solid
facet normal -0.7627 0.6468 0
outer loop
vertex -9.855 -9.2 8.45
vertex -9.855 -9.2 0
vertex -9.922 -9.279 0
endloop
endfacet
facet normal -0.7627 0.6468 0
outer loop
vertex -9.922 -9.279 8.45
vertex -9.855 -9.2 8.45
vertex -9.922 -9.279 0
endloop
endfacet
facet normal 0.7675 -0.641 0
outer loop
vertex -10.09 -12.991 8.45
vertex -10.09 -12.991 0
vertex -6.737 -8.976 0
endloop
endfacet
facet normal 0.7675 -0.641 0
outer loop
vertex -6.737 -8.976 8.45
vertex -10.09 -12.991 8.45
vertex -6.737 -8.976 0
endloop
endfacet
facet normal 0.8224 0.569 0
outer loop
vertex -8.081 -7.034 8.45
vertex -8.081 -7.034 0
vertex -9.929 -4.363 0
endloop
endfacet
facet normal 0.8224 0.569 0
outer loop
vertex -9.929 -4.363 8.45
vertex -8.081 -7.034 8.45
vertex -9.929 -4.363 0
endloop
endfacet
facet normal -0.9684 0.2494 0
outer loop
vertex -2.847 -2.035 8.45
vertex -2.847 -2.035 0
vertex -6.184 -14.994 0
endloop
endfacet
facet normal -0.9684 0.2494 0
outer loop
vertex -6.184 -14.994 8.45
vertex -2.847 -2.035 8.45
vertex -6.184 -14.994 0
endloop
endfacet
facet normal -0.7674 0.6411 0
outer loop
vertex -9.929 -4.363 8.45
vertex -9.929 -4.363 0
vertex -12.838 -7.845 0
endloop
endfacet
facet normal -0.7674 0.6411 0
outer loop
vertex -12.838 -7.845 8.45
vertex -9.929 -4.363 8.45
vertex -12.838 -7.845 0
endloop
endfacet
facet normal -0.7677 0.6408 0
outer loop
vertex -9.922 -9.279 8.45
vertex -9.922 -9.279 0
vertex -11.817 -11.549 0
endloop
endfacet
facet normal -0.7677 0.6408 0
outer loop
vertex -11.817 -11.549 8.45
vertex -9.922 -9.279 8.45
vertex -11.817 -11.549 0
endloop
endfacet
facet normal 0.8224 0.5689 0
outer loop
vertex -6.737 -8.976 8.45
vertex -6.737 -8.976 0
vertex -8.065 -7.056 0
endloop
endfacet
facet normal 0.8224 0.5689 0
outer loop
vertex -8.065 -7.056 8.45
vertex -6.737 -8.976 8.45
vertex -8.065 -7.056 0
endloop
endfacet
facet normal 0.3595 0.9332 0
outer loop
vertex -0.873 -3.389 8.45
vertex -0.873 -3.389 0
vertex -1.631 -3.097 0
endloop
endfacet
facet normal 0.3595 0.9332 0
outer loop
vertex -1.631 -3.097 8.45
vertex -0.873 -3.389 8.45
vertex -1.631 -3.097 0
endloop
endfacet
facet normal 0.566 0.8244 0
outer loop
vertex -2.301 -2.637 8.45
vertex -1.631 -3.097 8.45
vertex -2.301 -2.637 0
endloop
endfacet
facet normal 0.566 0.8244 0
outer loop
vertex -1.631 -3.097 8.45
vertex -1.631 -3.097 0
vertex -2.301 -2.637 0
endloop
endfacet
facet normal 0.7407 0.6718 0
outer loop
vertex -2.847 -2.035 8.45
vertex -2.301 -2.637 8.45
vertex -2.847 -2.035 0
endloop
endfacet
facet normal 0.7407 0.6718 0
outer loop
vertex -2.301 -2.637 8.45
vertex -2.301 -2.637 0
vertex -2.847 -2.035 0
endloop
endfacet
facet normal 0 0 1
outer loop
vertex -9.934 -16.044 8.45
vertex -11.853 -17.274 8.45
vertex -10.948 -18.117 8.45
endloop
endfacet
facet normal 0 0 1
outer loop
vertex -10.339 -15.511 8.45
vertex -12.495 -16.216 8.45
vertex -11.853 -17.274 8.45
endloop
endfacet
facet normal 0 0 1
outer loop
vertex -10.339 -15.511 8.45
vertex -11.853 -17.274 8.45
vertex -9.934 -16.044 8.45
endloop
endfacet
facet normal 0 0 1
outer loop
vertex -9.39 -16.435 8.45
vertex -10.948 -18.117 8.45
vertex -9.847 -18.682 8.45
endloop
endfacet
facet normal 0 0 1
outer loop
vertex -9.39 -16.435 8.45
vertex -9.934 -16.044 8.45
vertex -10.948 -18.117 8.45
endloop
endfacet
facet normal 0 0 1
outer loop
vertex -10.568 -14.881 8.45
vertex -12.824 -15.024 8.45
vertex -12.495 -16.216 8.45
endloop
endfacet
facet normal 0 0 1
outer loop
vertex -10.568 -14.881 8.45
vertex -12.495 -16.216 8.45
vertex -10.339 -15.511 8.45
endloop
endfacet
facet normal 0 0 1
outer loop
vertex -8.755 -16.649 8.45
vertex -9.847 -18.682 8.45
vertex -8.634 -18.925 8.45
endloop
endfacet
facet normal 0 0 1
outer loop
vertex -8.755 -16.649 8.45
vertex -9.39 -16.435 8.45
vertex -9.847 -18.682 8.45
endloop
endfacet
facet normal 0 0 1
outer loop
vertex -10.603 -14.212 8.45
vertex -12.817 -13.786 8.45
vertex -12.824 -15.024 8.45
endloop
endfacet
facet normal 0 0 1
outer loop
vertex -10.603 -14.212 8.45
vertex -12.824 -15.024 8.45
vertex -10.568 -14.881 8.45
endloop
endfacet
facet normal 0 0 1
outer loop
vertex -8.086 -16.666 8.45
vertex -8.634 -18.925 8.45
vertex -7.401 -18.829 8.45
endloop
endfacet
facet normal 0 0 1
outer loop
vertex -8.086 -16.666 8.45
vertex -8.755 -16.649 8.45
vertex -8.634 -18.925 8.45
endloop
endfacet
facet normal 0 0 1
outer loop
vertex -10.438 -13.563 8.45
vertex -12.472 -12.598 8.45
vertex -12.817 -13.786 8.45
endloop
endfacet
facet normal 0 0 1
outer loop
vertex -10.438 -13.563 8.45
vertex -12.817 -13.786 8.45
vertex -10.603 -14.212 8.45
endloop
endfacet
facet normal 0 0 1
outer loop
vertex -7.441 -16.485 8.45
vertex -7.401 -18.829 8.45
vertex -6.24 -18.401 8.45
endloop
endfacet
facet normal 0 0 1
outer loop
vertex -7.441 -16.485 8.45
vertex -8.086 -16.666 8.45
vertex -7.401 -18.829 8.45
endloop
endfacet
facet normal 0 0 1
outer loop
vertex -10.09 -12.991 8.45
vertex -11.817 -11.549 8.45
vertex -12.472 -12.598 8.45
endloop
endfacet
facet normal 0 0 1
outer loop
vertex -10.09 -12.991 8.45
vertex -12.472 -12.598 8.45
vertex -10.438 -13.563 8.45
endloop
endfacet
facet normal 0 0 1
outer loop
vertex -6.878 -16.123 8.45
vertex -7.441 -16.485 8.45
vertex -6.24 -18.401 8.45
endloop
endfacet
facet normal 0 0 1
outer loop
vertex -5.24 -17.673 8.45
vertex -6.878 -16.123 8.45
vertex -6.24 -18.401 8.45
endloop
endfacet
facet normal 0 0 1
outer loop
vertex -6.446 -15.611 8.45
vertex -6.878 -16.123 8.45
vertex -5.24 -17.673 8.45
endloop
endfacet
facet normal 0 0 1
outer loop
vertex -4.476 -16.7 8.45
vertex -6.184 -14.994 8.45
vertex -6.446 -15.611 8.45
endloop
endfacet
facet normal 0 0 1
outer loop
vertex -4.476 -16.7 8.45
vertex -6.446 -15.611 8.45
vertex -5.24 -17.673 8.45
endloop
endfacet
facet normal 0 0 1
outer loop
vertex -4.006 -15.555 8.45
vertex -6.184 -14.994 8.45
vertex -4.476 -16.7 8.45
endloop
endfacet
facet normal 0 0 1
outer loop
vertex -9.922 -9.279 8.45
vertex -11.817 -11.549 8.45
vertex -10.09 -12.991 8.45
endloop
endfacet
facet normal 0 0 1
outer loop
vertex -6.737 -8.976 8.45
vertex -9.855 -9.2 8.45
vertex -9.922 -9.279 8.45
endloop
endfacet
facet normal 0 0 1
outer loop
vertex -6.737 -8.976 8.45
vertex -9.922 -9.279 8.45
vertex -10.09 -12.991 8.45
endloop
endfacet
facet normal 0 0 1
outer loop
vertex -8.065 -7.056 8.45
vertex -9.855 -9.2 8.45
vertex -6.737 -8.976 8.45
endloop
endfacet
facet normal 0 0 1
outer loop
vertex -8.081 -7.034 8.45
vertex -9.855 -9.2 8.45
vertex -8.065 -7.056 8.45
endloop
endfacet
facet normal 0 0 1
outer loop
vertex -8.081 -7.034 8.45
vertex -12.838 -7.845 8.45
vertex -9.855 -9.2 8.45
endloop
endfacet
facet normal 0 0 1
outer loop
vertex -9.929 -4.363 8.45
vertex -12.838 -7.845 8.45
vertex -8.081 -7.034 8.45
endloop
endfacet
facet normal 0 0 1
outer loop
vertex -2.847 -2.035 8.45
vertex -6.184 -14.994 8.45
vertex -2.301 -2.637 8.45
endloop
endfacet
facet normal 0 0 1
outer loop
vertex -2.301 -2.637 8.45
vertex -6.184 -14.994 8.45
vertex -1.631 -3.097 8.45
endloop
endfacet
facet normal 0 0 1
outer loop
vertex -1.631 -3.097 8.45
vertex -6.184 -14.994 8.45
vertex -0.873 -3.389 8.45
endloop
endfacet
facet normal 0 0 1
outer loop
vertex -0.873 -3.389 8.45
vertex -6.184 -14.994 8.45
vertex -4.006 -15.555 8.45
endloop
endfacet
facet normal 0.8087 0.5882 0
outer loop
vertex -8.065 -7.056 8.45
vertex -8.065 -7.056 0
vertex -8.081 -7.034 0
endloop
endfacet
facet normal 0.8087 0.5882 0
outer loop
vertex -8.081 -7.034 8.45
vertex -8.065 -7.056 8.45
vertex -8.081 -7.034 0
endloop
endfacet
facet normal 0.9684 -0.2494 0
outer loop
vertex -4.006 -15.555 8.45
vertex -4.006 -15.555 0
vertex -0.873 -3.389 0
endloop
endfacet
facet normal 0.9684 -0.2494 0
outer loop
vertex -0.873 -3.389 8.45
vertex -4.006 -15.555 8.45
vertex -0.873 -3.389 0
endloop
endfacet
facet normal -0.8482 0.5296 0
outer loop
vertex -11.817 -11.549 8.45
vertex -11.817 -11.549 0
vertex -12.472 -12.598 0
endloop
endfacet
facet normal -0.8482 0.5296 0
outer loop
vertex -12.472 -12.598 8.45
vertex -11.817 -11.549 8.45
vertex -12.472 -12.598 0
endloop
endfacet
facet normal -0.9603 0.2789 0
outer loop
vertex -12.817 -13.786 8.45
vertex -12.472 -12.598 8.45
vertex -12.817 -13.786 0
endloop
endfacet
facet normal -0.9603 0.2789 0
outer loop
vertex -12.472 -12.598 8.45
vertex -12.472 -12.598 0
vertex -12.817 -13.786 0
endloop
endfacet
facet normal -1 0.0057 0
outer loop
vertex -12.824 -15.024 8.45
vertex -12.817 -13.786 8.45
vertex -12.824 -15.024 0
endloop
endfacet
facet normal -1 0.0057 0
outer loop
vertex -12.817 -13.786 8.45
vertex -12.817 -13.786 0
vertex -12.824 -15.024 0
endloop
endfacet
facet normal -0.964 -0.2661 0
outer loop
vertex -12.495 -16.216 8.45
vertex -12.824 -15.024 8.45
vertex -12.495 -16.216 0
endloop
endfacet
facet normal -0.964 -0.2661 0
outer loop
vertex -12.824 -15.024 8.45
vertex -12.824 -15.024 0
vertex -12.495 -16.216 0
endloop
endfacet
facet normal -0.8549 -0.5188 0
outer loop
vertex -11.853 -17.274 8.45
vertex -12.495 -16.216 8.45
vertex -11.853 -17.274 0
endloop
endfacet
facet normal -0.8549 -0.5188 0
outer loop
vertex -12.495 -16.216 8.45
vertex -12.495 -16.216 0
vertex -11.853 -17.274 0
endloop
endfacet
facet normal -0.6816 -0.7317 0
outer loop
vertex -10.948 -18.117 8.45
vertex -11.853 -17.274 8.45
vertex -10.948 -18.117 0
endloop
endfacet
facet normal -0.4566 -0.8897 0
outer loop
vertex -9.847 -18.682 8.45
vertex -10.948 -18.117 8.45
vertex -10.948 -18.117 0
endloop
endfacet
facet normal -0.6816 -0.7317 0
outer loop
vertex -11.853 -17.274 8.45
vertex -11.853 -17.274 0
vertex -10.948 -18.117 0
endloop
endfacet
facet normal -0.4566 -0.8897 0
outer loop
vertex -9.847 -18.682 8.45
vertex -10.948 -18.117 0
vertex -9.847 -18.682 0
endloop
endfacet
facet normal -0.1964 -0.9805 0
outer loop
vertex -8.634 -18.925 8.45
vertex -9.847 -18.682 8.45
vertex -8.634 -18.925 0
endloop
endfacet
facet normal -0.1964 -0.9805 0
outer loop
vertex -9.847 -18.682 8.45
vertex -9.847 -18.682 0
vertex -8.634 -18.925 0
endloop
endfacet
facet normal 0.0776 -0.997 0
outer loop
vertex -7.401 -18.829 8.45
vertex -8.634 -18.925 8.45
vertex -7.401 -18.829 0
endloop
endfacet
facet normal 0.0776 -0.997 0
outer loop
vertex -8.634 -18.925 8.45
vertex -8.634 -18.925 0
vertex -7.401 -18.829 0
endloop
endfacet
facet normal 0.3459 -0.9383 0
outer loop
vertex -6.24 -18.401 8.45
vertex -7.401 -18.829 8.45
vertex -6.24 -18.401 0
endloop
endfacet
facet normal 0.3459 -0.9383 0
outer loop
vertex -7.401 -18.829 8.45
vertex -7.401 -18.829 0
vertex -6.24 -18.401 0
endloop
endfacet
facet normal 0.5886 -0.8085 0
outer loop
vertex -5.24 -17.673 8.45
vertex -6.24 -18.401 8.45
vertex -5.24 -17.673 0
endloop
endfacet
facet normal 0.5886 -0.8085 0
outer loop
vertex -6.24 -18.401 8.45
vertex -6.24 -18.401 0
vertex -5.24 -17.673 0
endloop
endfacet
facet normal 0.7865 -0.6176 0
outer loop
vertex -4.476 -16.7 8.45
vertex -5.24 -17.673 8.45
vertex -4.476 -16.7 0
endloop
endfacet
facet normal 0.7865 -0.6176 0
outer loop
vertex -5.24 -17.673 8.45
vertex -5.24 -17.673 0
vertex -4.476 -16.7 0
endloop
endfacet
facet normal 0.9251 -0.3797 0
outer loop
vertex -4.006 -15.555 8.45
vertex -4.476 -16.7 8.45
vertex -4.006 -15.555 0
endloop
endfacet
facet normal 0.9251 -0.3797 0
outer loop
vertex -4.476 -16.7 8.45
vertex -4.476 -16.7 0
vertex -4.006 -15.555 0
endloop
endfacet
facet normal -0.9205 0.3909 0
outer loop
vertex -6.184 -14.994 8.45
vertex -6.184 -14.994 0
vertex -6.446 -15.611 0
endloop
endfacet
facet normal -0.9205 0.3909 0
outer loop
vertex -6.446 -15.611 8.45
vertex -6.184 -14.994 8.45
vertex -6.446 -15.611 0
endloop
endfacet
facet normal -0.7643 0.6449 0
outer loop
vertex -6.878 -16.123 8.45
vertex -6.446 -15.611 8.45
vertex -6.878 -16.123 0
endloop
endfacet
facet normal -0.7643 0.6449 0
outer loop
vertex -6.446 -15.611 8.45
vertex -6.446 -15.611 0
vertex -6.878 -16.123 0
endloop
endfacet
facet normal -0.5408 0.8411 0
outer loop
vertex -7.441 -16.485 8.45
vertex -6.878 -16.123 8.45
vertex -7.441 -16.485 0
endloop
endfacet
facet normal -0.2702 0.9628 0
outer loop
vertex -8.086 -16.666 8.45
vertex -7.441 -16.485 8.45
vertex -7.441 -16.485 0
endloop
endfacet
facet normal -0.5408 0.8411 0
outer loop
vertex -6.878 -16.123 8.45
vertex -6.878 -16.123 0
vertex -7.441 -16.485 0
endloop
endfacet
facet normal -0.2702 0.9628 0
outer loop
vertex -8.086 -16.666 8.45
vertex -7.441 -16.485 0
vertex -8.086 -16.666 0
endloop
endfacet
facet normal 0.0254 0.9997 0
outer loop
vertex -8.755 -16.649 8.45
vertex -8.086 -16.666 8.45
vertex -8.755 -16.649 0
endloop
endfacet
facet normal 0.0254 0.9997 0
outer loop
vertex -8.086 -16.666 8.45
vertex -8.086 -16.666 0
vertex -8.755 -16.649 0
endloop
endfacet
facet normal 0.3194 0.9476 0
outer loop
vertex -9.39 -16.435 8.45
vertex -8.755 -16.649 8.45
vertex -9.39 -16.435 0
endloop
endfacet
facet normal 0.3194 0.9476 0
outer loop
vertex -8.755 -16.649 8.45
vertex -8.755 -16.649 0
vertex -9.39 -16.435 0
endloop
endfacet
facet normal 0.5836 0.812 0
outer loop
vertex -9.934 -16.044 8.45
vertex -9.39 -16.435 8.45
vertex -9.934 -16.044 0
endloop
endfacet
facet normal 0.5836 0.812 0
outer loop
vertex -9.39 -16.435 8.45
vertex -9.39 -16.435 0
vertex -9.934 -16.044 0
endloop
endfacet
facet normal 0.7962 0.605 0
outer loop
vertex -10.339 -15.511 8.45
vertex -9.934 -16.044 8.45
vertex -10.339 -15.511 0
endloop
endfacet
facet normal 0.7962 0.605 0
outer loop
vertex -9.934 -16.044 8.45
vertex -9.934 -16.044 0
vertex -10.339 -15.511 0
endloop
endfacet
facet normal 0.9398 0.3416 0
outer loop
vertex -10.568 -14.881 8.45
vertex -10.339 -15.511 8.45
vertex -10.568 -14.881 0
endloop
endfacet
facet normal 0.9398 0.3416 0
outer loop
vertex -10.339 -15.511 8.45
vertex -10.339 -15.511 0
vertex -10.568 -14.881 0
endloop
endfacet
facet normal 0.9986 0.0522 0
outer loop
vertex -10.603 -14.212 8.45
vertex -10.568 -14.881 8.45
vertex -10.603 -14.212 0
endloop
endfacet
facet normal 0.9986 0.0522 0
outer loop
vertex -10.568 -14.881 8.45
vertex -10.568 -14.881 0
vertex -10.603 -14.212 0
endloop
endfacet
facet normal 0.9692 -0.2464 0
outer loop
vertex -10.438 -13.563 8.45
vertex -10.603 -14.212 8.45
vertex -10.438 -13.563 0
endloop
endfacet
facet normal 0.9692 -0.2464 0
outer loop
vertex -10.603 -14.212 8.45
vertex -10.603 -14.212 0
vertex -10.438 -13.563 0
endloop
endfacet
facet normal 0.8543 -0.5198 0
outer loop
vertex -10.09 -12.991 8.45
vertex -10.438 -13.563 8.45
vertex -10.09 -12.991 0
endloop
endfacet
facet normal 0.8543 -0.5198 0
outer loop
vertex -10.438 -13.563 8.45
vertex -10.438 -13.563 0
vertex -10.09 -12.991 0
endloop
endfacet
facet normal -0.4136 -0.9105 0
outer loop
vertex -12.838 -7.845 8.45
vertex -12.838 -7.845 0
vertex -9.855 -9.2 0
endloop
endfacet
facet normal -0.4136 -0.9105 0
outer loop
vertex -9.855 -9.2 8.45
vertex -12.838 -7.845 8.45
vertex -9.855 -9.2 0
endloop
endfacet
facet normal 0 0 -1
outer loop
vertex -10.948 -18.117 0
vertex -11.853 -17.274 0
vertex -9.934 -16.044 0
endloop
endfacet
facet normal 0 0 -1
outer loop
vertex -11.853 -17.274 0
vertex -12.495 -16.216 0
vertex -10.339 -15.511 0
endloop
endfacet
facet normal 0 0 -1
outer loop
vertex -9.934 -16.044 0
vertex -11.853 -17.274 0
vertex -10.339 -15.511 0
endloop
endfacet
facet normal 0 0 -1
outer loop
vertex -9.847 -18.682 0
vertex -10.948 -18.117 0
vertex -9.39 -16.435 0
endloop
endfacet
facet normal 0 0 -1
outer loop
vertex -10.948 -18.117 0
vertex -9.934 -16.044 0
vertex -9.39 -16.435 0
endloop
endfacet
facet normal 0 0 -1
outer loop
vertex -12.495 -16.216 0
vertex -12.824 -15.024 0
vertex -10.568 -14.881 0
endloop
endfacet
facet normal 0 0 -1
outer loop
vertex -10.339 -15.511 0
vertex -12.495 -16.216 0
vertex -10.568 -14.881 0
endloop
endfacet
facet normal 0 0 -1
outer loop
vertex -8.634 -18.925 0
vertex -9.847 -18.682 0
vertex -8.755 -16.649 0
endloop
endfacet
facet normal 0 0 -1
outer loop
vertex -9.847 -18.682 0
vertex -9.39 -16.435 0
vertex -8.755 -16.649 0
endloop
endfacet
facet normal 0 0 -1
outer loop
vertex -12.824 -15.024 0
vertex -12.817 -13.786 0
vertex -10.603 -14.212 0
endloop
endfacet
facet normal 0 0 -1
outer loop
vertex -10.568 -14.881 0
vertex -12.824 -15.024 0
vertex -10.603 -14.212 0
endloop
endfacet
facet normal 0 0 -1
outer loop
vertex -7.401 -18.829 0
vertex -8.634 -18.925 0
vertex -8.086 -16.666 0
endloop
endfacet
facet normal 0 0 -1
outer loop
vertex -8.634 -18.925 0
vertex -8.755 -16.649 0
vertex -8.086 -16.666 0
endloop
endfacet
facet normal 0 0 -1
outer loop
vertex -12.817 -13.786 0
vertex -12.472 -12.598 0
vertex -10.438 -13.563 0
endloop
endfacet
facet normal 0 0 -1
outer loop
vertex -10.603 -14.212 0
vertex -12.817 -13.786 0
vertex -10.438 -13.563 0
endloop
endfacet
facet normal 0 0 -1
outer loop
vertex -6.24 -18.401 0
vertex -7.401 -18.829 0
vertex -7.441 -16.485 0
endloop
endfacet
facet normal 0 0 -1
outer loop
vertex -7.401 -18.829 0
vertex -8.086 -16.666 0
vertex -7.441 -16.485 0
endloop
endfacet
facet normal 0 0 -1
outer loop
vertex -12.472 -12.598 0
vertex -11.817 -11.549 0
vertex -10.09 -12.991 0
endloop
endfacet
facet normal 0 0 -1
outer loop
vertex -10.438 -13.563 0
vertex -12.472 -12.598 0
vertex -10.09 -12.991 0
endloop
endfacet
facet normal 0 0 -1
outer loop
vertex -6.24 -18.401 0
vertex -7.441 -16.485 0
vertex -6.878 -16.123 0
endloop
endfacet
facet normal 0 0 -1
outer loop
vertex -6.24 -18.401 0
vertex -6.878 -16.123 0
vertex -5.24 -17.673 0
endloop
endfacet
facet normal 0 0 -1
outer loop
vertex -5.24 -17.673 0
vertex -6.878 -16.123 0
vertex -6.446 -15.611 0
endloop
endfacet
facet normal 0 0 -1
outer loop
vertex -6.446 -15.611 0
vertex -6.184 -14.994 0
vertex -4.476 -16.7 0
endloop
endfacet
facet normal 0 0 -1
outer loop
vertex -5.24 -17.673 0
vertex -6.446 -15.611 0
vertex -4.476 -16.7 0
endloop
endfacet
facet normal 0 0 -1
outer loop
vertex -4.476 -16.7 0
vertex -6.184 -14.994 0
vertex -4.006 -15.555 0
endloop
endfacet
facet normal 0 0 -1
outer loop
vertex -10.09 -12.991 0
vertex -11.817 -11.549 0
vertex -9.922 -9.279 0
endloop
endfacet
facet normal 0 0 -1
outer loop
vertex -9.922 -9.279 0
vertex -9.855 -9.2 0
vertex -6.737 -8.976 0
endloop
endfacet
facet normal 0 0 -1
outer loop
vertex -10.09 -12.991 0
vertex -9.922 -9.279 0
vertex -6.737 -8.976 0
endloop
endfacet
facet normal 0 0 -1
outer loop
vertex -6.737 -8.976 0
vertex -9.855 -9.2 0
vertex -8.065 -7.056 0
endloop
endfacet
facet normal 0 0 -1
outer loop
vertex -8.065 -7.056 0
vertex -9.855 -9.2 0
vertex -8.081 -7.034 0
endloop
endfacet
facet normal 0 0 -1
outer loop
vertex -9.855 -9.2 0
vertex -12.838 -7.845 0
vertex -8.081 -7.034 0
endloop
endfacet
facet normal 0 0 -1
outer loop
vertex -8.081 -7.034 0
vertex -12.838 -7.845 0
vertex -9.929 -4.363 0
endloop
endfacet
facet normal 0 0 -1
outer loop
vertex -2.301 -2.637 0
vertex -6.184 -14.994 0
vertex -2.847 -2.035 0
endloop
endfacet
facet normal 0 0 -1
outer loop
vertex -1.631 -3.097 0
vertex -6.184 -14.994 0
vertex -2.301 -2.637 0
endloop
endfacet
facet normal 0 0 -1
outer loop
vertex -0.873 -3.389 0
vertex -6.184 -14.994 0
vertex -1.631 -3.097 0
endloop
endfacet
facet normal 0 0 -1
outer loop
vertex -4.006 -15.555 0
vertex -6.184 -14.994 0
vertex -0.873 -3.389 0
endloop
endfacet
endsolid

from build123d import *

# Parameters (mm, degrees)
F1_DEPTH = 8.45


with BuildPart() as f1:
    # F0 (on Top) → F1 (new body)
    with BuildSketch(Plane.XY):
        with BuildLine():
            Line((-4.005518, -15.555335), (-0.872783, -3.389432))
            ThreePointArc((-0.872783, -3.389432), (-1.979533, -2.886425), (-2.84746, -2.035183))
            Line((-2.84746, -2.035183), (-6.184439, -14.99426))
            ThreePointArc((-6.184439, -14.99426), (-9.390213, -16.435202), (-10.090302, -12.990905))
            Line((-10.090302, -12.990905), (-6.736962, -8.975718))
            Line((-6.736962, -8.975718), (-8.065379, -7.056256))
            Line((-8.065379, -7.056256), (-9.855412, -9.199588))
            Line((-9.855412, -9.199588), (-9.921916, -9.279217))
            Line((-9.921916, -9.279217), (-11.817244, -11.548626))
            ThreePointArc((-11.817244, -11.548626), (-10.417067, -18.437219), (-4.005518, -15.555335))
        make_face()
        Polygon((-9.855412, -9.199588), (-8.065379, -7.056256), (-8.081104, -7.033535), (-9.929378, -4.36292), (-12.83781, -7.845389), align=None)
    extrude(amount=F1_DEPTH)


solid = f1.part
